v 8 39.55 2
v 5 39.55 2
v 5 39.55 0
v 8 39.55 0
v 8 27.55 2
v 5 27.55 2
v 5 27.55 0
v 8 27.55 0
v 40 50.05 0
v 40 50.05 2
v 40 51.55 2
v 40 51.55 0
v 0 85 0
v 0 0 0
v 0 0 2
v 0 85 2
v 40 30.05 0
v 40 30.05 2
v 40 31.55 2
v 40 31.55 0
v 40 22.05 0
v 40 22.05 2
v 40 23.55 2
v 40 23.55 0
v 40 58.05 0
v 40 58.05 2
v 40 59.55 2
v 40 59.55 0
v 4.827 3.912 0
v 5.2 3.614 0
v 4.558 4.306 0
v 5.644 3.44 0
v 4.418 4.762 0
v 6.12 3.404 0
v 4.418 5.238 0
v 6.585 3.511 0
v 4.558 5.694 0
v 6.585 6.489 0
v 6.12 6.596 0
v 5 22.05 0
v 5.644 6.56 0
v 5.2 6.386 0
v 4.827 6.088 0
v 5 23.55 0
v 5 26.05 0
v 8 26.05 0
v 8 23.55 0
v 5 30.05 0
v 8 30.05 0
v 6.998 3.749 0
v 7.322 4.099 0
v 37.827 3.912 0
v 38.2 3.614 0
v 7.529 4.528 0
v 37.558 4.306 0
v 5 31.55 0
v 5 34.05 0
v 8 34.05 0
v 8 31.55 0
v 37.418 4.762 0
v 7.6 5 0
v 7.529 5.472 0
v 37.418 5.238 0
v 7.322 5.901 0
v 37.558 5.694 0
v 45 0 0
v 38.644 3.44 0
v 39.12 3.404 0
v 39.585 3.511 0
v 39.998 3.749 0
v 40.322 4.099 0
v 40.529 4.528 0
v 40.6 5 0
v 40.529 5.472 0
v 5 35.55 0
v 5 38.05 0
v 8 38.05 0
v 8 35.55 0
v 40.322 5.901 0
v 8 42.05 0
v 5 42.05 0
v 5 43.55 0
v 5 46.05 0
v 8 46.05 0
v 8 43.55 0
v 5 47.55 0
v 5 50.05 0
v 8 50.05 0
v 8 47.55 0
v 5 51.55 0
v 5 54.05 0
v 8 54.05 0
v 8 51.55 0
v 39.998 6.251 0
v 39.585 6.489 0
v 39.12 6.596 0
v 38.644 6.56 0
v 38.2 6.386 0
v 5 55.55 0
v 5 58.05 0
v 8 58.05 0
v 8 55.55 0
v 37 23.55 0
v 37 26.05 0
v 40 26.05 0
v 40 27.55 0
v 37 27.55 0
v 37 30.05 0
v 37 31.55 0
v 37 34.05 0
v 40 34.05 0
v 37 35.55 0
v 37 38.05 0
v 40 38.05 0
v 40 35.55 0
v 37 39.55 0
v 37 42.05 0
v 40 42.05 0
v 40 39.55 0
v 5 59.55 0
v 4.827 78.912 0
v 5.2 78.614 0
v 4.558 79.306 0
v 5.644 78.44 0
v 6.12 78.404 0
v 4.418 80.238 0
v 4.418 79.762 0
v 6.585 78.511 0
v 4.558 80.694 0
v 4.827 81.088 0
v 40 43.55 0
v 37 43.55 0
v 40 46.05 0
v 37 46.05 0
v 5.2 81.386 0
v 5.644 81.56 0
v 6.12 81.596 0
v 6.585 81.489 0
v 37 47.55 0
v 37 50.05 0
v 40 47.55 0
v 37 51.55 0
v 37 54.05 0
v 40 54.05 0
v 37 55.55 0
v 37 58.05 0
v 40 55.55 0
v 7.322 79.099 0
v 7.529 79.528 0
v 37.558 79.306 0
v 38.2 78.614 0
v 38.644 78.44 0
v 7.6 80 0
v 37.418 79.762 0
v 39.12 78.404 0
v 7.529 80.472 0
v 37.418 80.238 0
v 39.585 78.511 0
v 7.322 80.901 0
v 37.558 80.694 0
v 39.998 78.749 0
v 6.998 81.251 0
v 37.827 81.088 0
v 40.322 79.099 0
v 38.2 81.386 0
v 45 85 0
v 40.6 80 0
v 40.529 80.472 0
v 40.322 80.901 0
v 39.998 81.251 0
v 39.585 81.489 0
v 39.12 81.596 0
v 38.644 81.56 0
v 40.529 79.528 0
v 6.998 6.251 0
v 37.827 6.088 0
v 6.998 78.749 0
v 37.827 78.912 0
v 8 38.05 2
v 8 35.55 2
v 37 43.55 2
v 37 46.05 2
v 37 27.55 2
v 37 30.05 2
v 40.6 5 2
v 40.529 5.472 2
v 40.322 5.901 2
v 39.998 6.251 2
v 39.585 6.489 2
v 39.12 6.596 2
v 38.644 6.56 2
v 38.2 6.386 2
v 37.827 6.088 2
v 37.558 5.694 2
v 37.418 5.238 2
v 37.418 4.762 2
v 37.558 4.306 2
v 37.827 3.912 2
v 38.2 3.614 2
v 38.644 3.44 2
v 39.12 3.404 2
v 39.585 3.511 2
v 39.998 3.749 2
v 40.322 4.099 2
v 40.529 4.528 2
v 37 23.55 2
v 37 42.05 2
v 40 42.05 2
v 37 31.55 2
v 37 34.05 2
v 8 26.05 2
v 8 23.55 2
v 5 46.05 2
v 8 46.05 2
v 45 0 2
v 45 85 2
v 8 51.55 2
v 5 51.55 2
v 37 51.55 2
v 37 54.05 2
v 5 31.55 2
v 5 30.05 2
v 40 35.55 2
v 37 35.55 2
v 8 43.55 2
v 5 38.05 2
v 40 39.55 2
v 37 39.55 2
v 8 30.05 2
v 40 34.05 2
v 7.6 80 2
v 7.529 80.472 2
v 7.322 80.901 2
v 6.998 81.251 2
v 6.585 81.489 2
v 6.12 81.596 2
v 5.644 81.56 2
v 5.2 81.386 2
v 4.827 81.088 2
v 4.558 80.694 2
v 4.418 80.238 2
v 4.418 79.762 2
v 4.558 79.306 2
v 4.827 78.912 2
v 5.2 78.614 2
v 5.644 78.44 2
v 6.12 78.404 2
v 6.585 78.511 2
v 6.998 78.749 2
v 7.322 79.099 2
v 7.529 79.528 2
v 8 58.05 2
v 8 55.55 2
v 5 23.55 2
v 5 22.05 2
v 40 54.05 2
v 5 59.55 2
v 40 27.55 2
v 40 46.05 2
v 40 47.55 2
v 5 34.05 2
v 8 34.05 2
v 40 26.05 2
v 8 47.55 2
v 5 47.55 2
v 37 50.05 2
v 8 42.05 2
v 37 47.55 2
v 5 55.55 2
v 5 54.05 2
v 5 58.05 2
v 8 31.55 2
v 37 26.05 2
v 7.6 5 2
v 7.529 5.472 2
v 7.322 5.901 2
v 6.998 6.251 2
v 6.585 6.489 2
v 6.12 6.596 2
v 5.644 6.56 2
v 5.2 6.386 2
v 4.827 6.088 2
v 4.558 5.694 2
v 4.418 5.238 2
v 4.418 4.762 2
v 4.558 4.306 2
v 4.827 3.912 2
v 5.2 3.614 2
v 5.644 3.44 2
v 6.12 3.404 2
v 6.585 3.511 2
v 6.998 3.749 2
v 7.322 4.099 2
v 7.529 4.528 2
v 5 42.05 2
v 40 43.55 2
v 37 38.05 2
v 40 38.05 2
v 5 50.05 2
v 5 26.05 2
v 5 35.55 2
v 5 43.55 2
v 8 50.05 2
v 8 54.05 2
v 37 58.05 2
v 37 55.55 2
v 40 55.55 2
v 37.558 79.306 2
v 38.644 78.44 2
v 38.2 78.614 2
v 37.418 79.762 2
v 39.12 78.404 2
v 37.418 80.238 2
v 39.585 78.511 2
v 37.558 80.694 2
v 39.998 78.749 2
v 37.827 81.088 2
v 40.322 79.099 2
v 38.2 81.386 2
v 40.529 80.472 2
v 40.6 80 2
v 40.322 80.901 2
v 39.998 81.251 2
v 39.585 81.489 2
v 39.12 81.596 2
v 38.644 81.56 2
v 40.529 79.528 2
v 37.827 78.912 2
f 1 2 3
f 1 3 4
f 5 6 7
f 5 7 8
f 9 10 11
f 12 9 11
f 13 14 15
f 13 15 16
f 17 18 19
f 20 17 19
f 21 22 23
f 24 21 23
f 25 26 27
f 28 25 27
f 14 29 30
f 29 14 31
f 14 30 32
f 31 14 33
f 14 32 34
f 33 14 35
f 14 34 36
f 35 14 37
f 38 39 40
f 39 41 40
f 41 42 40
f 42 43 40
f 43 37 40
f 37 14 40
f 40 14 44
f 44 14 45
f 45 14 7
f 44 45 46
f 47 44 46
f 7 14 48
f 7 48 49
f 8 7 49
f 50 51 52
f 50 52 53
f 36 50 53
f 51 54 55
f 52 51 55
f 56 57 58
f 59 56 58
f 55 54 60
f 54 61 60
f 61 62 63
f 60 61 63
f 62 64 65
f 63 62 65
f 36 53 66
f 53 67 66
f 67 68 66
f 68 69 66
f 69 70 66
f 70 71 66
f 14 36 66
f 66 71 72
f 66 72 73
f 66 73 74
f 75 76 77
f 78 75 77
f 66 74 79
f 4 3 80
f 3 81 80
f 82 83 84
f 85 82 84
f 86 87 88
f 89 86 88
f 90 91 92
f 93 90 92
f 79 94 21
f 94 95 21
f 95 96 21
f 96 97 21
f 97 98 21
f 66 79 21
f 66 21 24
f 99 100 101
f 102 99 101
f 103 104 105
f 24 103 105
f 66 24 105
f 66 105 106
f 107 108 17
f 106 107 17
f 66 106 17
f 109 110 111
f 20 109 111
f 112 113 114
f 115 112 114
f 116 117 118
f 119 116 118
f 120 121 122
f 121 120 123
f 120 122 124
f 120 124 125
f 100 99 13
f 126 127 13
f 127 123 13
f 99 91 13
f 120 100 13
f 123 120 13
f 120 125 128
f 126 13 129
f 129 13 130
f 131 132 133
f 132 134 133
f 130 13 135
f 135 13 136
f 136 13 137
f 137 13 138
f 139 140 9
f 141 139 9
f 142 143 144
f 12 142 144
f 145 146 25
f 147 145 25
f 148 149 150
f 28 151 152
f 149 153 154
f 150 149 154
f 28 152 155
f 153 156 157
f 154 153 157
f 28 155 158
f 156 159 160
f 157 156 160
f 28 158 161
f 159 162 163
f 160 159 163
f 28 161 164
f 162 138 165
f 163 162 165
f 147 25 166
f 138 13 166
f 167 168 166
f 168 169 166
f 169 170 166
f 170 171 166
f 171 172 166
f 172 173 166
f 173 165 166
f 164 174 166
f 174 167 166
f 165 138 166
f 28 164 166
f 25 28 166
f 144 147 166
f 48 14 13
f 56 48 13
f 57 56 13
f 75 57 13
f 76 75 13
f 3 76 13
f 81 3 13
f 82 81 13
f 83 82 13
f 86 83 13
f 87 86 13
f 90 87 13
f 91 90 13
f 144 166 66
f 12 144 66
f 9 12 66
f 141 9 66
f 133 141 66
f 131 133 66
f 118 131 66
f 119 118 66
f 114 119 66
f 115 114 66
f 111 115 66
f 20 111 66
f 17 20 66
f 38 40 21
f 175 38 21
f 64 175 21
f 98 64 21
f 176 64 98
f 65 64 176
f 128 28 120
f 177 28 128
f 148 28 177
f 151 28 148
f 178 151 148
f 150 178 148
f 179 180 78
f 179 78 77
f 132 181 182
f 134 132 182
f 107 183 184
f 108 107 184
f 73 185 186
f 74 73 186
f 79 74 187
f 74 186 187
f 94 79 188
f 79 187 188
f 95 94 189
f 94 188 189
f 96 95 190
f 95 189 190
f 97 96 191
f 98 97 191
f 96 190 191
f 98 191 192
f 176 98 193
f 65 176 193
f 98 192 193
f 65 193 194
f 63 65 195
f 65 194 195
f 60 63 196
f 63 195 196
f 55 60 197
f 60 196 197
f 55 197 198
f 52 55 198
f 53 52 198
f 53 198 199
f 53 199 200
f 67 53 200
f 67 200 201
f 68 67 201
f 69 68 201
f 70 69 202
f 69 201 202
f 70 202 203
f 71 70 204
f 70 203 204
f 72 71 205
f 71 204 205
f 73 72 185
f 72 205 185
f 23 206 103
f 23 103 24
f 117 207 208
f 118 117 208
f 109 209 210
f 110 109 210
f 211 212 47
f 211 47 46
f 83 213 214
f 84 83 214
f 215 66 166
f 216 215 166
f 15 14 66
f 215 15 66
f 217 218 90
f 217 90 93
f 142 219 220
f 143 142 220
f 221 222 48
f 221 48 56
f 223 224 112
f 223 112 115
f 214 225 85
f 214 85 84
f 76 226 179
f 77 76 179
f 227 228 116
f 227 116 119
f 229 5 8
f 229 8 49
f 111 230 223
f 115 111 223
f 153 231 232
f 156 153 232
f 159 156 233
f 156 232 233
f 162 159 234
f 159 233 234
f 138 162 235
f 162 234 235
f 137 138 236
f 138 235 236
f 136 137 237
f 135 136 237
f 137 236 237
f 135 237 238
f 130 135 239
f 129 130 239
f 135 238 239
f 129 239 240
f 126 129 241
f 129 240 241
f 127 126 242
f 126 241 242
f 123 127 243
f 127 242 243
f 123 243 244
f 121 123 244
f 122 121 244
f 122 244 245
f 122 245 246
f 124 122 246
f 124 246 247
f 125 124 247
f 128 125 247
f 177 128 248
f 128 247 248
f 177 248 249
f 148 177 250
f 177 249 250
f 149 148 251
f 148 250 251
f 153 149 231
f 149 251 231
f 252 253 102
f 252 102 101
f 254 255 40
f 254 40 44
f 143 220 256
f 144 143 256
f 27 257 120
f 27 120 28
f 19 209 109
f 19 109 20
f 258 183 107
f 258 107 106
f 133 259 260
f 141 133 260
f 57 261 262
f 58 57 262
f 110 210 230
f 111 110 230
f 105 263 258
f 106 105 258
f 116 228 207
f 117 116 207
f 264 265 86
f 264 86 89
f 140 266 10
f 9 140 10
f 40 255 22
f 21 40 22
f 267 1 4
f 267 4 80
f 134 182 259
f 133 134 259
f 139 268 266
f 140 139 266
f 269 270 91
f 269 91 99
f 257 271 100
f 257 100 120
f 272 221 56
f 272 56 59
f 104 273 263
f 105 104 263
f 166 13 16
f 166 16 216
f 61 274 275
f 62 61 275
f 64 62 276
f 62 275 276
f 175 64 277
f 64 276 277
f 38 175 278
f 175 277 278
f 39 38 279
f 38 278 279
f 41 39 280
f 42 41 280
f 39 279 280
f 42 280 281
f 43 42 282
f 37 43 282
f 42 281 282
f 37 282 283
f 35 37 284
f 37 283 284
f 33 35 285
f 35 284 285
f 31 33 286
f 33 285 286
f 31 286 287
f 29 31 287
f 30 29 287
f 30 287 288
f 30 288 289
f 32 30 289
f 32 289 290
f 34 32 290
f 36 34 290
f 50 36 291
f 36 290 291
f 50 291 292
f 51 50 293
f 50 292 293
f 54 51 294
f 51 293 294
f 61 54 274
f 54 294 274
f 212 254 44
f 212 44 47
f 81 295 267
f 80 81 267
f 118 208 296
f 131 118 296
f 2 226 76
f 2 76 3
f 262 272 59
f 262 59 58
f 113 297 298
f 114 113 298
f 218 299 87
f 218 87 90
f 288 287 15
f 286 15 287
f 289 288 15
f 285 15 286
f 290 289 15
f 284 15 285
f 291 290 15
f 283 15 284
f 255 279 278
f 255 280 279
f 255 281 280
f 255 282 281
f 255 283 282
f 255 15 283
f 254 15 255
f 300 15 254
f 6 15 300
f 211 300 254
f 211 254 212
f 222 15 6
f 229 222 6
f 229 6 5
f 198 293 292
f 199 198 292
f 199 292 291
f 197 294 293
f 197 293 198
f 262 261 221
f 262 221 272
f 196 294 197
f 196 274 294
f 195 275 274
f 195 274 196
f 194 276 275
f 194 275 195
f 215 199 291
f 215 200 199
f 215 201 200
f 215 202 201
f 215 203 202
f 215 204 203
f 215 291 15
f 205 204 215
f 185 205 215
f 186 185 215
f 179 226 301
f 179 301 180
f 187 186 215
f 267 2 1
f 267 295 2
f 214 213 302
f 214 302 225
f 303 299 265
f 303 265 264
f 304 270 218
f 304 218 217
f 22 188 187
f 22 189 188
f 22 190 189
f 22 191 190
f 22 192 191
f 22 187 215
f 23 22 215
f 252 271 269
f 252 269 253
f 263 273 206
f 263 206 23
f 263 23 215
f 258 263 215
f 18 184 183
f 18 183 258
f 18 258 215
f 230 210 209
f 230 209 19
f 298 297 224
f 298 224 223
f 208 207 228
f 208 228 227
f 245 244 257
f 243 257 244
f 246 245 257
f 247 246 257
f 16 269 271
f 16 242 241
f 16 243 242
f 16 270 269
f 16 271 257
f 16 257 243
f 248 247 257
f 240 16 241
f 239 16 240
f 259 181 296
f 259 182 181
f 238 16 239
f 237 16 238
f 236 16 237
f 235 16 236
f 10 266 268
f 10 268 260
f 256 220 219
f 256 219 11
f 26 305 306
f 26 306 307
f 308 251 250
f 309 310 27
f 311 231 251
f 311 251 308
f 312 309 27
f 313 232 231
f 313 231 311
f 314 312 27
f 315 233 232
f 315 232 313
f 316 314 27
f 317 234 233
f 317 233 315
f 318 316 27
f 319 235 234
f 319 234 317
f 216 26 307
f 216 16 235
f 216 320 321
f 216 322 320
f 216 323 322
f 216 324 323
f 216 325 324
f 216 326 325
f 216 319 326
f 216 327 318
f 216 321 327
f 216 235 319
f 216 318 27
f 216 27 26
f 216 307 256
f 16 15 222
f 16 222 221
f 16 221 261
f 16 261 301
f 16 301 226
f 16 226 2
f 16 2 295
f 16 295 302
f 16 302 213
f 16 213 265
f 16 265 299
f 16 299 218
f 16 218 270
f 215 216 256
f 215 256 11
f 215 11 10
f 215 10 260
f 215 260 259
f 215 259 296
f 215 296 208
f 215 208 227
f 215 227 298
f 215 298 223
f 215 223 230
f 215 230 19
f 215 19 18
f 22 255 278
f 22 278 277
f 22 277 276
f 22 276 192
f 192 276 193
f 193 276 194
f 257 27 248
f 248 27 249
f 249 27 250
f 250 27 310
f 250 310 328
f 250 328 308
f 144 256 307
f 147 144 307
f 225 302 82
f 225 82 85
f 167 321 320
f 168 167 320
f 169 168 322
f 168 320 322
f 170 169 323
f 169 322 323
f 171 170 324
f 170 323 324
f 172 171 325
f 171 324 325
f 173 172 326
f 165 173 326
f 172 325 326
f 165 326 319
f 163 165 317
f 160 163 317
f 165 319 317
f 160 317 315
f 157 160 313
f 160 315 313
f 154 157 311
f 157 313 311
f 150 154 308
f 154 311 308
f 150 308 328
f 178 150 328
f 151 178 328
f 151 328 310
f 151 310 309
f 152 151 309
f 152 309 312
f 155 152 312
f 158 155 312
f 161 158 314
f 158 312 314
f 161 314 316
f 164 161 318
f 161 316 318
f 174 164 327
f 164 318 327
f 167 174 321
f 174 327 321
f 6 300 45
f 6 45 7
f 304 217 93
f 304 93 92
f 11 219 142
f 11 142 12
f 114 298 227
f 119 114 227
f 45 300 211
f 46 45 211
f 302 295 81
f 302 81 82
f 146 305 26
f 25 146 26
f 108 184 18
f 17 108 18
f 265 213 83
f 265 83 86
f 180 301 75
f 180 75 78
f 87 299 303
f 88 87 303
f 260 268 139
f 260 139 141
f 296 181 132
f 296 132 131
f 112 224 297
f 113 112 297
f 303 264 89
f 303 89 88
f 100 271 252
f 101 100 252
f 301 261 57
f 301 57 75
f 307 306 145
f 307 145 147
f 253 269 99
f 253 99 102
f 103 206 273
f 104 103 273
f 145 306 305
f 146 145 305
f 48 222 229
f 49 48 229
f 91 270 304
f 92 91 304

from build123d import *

# Parameters (mm, degrees)
SKIZZE1_W                       = 45
SKIZZE1_H                       = 85
AUFSATZ_LINEAR_AUSTRAGEN1_DEPTH = 2
SKIZZE6_R                       = 1.6
SCHNITT_LINEAR_AUSTRAGEN2_DEPTH = 2
SKIZZE7_W                       = 35
SKIZZE7_H                       = 1.5
SCHNITT_LINEAR_AUSTRAGEN3_DEPTH = 10
SKIZZE8_W                       = 29
SKIZZE8_H                       = 37.5
SCHNITT_LINEAR_AUSTRAGEN4_DEPTH = 10


with BuildPart() as part:
    # Skizze1 → Aufsatz-Linear austragen1 (new body)
    with BuildSketch(Plane.XY):
        with Locations((22.5, 42.5)):
            Rectangle(SKIZZE1_W, SKIZZE1_H)
    extrude(amount=AUFSATZ_LINEAR_AUSTRAGEN1_DEPTH)

    # Skizze6 → Schnitt-Linear austragen2 (cut)
    with BuildSketch(Plane.XY.offset(2)):
        with Locations((6, 80)):
            Circle(SKIZZE6_R)
        with Locations((39, 80)):
            Circle(SKIZZE6_R)
        with Locations((39, 5)):
            Circle(SKIZZE6_R)
        with Locations((6, 5)):
            Circle(SKIZZE6_R)
    extrude(amount=-SCHNITT_LINEAR_AUSTRAGEN2_DEPTH, mode=Mode.SUBTRACT)

    # Skizze7 → Schnitt-Linear austragen3 (cut)
    with BuildSketch(Plane.XY.offset(2)):
        with Locations((22.5, 58.8)):
            Rectangle(SKIZZE7_W, SKIZZE7_H)
        with Locations((22.5, 54.8)):
            Rectangle(SKIZZE7_W, SKIZZE7_H)
        with Locations((22.5, 50.8)):
            Rectangle(SKIZZE7_W, SKIZZE7_H)
        with Locations((22.5, 46.8)):
            Rectangle(SKIZZE7_W, SKIZZE7_H)
        with Locations((22.5, 42.8)):
            Rectangle(SKIZZE7_W, SKIZZE7_H)
        with Locations((22.5, 38.8)):
            Rectangle(SKIZZE7_W, SKIZZE7_H)
        with Locations((22.5, 34.8)):
            Rectangle(SKIZZE7_W, SKIZZE7_H)
        with Locations((22.5, 30.8)):
            Rectangle(SKIZZE7_W, SKIZZE7_H)
        with Locations((22.5, 26.8)):
            Rectangle(SKIZZE7_W, SKIZZE7_H)
        with Locations((22.5, 22.8)):
            Rectangle(SKIZZE7_W, SKIZZE7_H)
    extrude(amount=-SCHNITT_LINEAR_AUSTRAGEN3_DEPTH, mode=Mode.SUBTRACT)

    # Skizze8 → Schnitt-Linear austragen4 (cut)
    with BuildSketch(Plane.XY.offset(2)):
        with Locations((22.5, 40.8)):
            Rectangle(SKIZZE8_W, SKIZZE8_H)
    extrude(amount=-SCHNITT_LINEAR_AUSTRAGEN4_DEPTH, mode=Mode.SUBTRACT)


solid = part.part
